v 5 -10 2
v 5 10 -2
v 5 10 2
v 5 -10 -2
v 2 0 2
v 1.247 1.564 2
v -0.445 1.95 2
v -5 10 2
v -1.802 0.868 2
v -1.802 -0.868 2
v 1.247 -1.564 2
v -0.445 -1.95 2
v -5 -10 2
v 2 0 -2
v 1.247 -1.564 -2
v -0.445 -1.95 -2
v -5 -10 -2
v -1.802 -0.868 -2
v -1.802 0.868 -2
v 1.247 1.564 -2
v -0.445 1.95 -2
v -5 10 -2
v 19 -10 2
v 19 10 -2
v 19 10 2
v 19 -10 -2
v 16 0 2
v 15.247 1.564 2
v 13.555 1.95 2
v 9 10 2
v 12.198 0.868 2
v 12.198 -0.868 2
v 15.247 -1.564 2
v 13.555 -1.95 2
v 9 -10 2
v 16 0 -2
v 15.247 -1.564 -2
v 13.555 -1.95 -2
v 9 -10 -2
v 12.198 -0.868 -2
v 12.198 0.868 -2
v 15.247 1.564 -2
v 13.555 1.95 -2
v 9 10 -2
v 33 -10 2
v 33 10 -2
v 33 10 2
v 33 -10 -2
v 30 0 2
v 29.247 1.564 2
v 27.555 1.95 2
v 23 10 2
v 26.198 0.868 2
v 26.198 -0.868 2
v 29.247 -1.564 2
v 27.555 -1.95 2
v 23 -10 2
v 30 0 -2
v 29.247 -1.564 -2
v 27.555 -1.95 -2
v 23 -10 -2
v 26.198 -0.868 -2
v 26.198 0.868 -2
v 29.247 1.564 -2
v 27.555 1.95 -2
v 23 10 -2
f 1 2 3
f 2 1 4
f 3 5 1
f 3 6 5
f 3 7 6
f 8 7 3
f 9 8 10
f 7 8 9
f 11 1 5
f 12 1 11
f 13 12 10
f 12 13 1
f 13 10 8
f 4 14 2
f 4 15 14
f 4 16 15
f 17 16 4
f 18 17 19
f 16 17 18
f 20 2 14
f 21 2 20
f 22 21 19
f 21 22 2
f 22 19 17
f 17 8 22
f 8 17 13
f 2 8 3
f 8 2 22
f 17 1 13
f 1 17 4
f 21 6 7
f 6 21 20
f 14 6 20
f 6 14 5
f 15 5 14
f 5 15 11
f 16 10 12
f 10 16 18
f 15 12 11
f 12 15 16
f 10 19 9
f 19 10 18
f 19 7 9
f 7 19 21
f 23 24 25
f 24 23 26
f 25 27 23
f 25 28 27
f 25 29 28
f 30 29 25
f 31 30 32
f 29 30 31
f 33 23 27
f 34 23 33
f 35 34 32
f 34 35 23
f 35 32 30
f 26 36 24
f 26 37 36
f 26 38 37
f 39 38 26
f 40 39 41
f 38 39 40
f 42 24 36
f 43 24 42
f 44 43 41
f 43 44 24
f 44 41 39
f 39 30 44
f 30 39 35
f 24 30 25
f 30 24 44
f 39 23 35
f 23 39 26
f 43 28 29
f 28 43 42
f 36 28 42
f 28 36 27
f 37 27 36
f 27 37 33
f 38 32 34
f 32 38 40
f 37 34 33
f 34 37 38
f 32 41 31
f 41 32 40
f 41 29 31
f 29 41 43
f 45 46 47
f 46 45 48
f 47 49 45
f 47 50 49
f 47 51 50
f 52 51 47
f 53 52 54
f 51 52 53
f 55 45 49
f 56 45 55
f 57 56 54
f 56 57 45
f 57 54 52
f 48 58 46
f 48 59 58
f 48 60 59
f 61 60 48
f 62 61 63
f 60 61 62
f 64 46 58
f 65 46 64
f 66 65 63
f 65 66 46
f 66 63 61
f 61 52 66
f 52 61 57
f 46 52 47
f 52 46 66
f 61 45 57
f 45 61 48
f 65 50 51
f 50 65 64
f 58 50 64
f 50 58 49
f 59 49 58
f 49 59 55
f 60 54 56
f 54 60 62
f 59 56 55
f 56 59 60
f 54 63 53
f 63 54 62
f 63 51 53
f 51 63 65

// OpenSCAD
module widget(size = [10, 20, 4], radius = 2) {
  difference() {
    cube(size, center = true);
    translate([0, 0, 1]) cylinder(h = 8, r = radius, center = true);
  }
}

for (i = [0 : 2]) {
  translate([i * 14, 0, 0]) widget();
}
